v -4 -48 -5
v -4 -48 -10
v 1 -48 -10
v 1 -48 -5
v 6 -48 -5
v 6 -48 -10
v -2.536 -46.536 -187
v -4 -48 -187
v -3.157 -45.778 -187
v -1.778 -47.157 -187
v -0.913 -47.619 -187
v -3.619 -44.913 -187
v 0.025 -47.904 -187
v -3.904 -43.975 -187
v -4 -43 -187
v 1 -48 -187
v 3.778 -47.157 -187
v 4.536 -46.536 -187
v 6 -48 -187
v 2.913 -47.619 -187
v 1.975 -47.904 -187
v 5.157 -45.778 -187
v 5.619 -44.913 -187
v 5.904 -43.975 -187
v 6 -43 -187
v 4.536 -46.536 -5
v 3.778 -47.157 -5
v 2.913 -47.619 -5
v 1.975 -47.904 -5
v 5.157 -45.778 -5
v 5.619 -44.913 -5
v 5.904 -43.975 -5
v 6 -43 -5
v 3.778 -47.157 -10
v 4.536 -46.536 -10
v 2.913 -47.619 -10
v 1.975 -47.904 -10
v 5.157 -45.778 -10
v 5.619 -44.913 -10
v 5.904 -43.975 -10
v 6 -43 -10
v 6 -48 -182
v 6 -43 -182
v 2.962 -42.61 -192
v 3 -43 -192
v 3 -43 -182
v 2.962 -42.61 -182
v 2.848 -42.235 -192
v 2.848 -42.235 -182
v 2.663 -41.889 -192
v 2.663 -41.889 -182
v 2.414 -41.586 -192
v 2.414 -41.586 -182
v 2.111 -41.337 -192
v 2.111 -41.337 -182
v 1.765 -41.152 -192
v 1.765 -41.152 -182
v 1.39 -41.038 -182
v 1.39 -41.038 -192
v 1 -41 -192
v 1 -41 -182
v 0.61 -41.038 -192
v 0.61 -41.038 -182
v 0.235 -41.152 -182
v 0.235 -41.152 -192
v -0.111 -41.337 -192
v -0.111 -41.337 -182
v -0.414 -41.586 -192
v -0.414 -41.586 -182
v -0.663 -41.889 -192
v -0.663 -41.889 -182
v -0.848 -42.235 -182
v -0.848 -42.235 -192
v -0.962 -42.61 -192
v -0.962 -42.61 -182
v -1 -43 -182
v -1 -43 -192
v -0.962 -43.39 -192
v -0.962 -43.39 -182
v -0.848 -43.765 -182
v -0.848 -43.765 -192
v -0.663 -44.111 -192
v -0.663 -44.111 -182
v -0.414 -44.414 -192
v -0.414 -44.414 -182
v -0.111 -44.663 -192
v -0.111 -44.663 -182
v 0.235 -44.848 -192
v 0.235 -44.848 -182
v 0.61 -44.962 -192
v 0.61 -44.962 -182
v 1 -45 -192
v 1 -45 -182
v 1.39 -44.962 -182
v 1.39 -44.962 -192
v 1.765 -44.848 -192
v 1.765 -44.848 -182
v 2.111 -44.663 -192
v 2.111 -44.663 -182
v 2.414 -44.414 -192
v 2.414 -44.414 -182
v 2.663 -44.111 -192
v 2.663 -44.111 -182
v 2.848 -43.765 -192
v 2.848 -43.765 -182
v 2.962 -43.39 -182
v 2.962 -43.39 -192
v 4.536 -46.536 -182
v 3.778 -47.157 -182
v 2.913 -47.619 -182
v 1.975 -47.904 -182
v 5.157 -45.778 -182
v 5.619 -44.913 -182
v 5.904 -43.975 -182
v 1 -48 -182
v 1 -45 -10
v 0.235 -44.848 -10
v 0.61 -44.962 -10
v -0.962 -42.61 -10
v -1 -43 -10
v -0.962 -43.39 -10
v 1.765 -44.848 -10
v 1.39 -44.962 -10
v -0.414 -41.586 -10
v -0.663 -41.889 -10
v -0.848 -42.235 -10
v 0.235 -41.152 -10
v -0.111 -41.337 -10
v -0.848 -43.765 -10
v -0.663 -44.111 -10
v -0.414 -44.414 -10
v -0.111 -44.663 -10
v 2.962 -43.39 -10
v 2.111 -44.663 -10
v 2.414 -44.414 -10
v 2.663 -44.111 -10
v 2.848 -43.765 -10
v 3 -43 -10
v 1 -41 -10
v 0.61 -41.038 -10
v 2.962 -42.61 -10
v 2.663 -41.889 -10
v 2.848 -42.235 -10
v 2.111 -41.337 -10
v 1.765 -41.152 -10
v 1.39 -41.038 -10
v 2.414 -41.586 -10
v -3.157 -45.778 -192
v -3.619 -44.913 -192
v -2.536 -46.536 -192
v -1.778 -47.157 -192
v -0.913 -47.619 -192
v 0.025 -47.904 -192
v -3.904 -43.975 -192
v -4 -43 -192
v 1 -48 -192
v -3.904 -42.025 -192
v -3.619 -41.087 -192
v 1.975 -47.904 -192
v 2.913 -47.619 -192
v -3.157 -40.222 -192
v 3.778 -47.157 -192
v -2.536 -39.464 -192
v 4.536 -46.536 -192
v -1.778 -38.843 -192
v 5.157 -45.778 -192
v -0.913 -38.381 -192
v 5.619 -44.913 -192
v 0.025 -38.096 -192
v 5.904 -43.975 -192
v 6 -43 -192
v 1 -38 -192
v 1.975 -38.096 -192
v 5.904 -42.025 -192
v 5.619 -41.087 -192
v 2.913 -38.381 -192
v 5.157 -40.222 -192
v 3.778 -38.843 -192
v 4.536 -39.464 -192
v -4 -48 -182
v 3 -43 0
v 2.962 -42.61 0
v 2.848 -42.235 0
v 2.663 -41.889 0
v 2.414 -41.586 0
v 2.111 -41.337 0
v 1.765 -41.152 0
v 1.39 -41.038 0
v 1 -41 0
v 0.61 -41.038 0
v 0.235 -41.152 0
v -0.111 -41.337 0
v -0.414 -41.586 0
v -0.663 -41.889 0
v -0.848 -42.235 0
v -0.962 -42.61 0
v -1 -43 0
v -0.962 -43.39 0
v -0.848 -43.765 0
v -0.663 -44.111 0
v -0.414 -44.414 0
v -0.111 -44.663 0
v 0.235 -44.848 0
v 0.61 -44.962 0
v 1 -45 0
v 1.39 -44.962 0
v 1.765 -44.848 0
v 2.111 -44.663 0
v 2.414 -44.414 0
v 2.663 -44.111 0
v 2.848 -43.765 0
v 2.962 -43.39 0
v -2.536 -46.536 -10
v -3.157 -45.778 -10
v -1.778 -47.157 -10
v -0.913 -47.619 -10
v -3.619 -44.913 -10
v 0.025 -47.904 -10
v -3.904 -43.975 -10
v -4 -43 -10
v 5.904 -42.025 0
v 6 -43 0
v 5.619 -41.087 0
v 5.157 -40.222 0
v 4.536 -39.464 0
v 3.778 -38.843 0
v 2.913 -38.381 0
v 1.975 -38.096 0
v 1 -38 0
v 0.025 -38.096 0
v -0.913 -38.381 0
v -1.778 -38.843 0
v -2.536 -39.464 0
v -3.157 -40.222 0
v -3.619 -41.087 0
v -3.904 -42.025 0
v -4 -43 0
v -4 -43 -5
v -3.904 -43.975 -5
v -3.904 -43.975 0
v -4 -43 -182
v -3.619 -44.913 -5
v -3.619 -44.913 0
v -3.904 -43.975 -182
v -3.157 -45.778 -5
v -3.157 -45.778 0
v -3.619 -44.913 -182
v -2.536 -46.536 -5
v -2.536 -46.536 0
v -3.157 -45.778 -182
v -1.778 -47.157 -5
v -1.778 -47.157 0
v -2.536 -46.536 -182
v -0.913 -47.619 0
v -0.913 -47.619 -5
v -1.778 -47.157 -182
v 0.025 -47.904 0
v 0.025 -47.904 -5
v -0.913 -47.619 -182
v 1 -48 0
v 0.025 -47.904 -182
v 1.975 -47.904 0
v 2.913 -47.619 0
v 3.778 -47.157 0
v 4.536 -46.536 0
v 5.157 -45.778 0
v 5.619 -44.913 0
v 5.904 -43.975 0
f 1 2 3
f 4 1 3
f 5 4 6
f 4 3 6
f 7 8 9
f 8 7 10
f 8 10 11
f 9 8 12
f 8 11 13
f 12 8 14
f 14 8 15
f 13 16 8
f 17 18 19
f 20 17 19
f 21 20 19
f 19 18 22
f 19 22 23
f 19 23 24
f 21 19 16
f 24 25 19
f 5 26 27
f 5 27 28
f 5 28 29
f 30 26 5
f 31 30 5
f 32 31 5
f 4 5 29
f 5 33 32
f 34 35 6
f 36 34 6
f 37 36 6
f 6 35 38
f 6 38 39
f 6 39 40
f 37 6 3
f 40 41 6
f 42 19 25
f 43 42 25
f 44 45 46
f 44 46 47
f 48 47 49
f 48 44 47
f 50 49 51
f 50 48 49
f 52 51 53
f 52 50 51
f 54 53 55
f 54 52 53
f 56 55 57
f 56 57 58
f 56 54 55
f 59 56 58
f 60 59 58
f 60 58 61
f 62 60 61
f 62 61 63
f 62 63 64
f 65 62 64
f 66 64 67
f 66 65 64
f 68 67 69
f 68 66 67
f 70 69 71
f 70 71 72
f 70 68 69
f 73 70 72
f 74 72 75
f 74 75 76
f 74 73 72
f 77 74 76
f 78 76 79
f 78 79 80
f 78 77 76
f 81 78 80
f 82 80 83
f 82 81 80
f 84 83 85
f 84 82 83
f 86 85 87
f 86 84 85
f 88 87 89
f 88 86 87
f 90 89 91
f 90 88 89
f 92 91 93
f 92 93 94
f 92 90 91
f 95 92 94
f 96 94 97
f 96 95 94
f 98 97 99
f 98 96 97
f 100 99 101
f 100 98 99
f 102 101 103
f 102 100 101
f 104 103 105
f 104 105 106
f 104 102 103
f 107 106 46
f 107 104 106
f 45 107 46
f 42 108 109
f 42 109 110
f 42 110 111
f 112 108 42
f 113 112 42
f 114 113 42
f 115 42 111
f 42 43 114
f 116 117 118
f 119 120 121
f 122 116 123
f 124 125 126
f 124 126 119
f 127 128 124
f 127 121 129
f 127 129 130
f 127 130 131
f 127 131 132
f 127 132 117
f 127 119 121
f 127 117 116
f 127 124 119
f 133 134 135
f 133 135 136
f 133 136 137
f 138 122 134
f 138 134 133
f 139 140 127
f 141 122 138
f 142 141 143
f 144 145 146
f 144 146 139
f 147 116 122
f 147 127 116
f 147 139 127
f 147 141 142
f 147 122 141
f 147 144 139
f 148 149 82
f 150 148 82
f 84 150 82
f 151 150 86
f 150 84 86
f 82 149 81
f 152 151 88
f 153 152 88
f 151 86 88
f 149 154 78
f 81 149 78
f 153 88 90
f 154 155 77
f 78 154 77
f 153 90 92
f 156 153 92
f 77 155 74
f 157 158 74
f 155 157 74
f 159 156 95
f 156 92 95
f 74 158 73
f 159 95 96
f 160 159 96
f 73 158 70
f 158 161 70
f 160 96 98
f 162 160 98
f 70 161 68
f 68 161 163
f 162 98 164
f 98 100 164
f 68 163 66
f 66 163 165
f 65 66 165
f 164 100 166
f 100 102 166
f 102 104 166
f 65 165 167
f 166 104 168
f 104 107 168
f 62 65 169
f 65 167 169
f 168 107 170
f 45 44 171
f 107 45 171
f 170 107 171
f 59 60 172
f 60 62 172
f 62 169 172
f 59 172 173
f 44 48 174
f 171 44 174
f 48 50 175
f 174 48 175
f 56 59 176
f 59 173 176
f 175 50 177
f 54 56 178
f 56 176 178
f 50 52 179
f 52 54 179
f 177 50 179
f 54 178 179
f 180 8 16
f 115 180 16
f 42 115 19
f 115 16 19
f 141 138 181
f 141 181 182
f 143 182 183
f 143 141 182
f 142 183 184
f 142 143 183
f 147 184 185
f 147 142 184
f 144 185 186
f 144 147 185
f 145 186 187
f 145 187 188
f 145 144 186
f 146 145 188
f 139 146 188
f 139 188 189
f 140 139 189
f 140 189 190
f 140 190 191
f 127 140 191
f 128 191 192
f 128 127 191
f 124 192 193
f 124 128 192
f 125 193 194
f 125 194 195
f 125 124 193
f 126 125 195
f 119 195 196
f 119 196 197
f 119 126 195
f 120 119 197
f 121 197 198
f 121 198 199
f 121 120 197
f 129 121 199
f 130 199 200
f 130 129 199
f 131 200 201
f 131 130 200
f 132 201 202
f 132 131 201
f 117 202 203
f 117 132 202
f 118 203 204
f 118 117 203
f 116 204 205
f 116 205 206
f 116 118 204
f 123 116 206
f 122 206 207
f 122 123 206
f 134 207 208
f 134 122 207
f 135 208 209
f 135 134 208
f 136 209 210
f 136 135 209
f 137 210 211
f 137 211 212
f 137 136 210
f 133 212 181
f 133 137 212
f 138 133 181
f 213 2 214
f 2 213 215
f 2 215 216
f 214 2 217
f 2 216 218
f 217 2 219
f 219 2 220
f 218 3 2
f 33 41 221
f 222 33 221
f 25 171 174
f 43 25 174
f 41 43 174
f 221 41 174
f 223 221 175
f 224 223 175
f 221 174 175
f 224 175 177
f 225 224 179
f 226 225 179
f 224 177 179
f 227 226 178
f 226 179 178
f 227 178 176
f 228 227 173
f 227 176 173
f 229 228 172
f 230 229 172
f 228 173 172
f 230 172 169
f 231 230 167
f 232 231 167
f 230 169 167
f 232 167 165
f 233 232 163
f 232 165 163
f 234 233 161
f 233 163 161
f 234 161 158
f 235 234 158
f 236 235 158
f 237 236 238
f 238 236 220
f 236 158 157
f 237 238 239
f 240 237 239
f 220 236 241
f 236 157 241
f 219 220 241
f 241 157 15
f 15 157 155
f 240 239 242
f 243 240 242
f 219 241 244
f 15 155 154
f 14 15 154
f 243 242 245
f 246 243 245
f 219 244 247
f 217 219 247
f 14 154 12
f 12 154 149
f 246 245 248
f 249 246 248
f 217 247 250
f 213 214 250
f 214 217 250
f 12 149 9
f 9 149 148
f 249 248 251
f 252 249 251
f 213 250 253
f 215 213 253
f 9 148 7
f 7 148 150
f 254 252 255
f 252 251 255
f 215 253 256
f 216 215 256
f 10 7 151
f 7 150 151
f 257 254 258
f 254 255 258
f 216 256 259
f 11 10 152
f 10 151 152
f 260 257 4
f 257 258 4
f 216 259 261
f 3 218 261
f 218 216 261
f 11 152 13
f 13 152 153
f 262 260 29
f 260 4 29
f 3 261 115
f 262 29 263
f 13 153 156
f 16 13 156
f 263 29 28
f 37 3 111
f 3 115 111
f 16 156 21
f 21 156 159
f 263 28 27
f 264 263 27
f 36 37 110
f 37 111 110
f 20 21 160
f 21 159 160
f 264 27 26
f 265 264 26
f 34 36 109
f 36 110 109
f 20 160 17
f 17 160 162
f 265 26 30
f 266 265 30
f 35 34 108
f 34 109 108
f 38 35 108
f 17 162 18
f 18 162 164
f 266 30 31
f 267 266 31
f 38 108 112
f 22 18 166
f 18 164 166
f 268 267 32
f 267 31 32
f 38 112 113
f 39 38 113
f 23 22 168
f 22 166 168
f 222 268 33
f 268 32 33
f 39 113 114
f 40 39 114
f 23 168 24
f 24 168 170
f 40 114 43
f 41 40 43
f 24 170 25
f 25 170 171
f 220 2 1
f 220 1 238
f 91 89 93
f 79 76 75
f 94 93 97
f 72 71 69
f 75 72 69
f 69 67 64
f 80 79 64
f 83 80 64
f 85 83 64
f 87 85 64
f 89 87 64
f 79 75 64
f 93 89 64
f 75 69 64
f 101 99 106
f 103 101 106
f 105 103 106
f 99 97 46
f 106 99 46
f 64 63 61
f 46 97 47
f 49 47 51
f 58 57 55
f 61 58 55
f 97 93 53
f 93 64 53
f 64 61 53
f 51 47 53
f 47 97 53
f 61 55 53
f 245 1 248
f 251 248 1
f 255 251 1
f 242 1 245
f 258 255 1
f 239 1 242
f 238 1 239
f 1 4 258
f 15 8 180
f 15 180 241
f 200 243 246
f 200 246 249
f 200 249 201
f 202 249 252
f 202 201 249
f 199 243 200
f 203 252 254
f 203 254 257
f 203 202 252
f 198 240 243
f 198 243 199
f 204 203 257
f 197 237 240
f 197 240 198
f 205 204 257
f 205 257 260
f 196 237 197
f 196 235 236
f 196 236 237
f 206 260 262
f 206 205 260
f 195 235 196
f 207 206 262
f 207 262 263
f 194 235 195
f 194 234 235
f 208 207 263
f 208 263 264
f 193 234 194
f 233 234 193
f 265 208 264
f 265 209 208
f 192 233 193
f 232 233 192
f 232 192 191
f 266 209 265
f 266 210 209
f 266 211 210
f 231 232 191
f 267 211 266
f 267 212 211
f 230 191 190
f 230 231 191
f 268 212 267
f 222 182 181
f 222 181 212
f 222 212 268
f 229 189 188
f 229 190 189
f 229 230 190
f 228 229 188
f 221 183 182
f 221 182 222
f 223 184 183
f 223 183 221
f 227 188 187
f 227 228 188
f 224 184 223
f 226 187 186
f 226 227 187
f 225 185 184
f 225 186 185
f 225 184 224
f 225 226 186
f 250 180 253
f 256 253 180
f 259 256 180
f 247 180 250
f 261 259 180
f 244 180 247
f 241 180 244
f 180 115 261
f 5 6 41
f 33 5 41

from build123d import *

# Parameters (mm, degrees)
CYLINDER006_R     = 5
CYLINDER006_DEPTH = 192
BOX003_W          = 10
BOX003_H          = 5
BOX003_DEPTH      = 5
BOX004_W          = 10
BOX004_H          = 5
BOX004_DEPTH      = 5
CYLINDER007_R     = 2
CYLINDER007_DEPTH = 10
CYLINDER008_R     = 2
CYLINDER008_DEPTH = 10


with BuildPart() as part:
    # Cylinder006 → Cylinder006 (join)
    with BuildSketch(Plane.XY):
        Circle(CYLINDER006_R)
    extrude(amount=CYLINDER006_DEPTH)

    # Box003 → Box003 (join)
    with BuildSketch(Plane(origin=(-5, -5, 182), x_dir=(1, 0, 0), z_dir=(0, 0, 1))):
        with Locations((5, 2.5)):
            Rectangle(BOX003_W, BOX003_H)
    extrude(amount=BOX003_DEPTH)

    # Box004 → Box004 (join)
    with BuildSketch(Plane(origin=(-5, -5, 5), x_dir=(1, 0, 0), z_dir=(0, 0, 1))):
        with Locations((5, 2.5)):
            Rectangle(BOX004_W, BOX004_H)
    extrude(amount=BOX004_DEPTH)

    # Cylinder007 → Cylinder007 (cut)
    with BuildSketch(Plane.XY):
        Circle(CYLINDER007_R)
    extrude(amount=CYLINDER007_DEPTH, mode=Mode.SUBTRACT)

    # Cylinder008 → Cylinder008 (cut)
    with BuildSketch(Plane.XY.offset(182)):
        Circle(CYLINDER008_R)
    extrude(amount=CYLINDER008_DEPTH, mode=Mode.SUBTRACT)


with BuildPart() as part_1:
    # Body004 placement: moved
    add(part.part.moved(Location((1, -43, -192))))


solid = part_1.part
